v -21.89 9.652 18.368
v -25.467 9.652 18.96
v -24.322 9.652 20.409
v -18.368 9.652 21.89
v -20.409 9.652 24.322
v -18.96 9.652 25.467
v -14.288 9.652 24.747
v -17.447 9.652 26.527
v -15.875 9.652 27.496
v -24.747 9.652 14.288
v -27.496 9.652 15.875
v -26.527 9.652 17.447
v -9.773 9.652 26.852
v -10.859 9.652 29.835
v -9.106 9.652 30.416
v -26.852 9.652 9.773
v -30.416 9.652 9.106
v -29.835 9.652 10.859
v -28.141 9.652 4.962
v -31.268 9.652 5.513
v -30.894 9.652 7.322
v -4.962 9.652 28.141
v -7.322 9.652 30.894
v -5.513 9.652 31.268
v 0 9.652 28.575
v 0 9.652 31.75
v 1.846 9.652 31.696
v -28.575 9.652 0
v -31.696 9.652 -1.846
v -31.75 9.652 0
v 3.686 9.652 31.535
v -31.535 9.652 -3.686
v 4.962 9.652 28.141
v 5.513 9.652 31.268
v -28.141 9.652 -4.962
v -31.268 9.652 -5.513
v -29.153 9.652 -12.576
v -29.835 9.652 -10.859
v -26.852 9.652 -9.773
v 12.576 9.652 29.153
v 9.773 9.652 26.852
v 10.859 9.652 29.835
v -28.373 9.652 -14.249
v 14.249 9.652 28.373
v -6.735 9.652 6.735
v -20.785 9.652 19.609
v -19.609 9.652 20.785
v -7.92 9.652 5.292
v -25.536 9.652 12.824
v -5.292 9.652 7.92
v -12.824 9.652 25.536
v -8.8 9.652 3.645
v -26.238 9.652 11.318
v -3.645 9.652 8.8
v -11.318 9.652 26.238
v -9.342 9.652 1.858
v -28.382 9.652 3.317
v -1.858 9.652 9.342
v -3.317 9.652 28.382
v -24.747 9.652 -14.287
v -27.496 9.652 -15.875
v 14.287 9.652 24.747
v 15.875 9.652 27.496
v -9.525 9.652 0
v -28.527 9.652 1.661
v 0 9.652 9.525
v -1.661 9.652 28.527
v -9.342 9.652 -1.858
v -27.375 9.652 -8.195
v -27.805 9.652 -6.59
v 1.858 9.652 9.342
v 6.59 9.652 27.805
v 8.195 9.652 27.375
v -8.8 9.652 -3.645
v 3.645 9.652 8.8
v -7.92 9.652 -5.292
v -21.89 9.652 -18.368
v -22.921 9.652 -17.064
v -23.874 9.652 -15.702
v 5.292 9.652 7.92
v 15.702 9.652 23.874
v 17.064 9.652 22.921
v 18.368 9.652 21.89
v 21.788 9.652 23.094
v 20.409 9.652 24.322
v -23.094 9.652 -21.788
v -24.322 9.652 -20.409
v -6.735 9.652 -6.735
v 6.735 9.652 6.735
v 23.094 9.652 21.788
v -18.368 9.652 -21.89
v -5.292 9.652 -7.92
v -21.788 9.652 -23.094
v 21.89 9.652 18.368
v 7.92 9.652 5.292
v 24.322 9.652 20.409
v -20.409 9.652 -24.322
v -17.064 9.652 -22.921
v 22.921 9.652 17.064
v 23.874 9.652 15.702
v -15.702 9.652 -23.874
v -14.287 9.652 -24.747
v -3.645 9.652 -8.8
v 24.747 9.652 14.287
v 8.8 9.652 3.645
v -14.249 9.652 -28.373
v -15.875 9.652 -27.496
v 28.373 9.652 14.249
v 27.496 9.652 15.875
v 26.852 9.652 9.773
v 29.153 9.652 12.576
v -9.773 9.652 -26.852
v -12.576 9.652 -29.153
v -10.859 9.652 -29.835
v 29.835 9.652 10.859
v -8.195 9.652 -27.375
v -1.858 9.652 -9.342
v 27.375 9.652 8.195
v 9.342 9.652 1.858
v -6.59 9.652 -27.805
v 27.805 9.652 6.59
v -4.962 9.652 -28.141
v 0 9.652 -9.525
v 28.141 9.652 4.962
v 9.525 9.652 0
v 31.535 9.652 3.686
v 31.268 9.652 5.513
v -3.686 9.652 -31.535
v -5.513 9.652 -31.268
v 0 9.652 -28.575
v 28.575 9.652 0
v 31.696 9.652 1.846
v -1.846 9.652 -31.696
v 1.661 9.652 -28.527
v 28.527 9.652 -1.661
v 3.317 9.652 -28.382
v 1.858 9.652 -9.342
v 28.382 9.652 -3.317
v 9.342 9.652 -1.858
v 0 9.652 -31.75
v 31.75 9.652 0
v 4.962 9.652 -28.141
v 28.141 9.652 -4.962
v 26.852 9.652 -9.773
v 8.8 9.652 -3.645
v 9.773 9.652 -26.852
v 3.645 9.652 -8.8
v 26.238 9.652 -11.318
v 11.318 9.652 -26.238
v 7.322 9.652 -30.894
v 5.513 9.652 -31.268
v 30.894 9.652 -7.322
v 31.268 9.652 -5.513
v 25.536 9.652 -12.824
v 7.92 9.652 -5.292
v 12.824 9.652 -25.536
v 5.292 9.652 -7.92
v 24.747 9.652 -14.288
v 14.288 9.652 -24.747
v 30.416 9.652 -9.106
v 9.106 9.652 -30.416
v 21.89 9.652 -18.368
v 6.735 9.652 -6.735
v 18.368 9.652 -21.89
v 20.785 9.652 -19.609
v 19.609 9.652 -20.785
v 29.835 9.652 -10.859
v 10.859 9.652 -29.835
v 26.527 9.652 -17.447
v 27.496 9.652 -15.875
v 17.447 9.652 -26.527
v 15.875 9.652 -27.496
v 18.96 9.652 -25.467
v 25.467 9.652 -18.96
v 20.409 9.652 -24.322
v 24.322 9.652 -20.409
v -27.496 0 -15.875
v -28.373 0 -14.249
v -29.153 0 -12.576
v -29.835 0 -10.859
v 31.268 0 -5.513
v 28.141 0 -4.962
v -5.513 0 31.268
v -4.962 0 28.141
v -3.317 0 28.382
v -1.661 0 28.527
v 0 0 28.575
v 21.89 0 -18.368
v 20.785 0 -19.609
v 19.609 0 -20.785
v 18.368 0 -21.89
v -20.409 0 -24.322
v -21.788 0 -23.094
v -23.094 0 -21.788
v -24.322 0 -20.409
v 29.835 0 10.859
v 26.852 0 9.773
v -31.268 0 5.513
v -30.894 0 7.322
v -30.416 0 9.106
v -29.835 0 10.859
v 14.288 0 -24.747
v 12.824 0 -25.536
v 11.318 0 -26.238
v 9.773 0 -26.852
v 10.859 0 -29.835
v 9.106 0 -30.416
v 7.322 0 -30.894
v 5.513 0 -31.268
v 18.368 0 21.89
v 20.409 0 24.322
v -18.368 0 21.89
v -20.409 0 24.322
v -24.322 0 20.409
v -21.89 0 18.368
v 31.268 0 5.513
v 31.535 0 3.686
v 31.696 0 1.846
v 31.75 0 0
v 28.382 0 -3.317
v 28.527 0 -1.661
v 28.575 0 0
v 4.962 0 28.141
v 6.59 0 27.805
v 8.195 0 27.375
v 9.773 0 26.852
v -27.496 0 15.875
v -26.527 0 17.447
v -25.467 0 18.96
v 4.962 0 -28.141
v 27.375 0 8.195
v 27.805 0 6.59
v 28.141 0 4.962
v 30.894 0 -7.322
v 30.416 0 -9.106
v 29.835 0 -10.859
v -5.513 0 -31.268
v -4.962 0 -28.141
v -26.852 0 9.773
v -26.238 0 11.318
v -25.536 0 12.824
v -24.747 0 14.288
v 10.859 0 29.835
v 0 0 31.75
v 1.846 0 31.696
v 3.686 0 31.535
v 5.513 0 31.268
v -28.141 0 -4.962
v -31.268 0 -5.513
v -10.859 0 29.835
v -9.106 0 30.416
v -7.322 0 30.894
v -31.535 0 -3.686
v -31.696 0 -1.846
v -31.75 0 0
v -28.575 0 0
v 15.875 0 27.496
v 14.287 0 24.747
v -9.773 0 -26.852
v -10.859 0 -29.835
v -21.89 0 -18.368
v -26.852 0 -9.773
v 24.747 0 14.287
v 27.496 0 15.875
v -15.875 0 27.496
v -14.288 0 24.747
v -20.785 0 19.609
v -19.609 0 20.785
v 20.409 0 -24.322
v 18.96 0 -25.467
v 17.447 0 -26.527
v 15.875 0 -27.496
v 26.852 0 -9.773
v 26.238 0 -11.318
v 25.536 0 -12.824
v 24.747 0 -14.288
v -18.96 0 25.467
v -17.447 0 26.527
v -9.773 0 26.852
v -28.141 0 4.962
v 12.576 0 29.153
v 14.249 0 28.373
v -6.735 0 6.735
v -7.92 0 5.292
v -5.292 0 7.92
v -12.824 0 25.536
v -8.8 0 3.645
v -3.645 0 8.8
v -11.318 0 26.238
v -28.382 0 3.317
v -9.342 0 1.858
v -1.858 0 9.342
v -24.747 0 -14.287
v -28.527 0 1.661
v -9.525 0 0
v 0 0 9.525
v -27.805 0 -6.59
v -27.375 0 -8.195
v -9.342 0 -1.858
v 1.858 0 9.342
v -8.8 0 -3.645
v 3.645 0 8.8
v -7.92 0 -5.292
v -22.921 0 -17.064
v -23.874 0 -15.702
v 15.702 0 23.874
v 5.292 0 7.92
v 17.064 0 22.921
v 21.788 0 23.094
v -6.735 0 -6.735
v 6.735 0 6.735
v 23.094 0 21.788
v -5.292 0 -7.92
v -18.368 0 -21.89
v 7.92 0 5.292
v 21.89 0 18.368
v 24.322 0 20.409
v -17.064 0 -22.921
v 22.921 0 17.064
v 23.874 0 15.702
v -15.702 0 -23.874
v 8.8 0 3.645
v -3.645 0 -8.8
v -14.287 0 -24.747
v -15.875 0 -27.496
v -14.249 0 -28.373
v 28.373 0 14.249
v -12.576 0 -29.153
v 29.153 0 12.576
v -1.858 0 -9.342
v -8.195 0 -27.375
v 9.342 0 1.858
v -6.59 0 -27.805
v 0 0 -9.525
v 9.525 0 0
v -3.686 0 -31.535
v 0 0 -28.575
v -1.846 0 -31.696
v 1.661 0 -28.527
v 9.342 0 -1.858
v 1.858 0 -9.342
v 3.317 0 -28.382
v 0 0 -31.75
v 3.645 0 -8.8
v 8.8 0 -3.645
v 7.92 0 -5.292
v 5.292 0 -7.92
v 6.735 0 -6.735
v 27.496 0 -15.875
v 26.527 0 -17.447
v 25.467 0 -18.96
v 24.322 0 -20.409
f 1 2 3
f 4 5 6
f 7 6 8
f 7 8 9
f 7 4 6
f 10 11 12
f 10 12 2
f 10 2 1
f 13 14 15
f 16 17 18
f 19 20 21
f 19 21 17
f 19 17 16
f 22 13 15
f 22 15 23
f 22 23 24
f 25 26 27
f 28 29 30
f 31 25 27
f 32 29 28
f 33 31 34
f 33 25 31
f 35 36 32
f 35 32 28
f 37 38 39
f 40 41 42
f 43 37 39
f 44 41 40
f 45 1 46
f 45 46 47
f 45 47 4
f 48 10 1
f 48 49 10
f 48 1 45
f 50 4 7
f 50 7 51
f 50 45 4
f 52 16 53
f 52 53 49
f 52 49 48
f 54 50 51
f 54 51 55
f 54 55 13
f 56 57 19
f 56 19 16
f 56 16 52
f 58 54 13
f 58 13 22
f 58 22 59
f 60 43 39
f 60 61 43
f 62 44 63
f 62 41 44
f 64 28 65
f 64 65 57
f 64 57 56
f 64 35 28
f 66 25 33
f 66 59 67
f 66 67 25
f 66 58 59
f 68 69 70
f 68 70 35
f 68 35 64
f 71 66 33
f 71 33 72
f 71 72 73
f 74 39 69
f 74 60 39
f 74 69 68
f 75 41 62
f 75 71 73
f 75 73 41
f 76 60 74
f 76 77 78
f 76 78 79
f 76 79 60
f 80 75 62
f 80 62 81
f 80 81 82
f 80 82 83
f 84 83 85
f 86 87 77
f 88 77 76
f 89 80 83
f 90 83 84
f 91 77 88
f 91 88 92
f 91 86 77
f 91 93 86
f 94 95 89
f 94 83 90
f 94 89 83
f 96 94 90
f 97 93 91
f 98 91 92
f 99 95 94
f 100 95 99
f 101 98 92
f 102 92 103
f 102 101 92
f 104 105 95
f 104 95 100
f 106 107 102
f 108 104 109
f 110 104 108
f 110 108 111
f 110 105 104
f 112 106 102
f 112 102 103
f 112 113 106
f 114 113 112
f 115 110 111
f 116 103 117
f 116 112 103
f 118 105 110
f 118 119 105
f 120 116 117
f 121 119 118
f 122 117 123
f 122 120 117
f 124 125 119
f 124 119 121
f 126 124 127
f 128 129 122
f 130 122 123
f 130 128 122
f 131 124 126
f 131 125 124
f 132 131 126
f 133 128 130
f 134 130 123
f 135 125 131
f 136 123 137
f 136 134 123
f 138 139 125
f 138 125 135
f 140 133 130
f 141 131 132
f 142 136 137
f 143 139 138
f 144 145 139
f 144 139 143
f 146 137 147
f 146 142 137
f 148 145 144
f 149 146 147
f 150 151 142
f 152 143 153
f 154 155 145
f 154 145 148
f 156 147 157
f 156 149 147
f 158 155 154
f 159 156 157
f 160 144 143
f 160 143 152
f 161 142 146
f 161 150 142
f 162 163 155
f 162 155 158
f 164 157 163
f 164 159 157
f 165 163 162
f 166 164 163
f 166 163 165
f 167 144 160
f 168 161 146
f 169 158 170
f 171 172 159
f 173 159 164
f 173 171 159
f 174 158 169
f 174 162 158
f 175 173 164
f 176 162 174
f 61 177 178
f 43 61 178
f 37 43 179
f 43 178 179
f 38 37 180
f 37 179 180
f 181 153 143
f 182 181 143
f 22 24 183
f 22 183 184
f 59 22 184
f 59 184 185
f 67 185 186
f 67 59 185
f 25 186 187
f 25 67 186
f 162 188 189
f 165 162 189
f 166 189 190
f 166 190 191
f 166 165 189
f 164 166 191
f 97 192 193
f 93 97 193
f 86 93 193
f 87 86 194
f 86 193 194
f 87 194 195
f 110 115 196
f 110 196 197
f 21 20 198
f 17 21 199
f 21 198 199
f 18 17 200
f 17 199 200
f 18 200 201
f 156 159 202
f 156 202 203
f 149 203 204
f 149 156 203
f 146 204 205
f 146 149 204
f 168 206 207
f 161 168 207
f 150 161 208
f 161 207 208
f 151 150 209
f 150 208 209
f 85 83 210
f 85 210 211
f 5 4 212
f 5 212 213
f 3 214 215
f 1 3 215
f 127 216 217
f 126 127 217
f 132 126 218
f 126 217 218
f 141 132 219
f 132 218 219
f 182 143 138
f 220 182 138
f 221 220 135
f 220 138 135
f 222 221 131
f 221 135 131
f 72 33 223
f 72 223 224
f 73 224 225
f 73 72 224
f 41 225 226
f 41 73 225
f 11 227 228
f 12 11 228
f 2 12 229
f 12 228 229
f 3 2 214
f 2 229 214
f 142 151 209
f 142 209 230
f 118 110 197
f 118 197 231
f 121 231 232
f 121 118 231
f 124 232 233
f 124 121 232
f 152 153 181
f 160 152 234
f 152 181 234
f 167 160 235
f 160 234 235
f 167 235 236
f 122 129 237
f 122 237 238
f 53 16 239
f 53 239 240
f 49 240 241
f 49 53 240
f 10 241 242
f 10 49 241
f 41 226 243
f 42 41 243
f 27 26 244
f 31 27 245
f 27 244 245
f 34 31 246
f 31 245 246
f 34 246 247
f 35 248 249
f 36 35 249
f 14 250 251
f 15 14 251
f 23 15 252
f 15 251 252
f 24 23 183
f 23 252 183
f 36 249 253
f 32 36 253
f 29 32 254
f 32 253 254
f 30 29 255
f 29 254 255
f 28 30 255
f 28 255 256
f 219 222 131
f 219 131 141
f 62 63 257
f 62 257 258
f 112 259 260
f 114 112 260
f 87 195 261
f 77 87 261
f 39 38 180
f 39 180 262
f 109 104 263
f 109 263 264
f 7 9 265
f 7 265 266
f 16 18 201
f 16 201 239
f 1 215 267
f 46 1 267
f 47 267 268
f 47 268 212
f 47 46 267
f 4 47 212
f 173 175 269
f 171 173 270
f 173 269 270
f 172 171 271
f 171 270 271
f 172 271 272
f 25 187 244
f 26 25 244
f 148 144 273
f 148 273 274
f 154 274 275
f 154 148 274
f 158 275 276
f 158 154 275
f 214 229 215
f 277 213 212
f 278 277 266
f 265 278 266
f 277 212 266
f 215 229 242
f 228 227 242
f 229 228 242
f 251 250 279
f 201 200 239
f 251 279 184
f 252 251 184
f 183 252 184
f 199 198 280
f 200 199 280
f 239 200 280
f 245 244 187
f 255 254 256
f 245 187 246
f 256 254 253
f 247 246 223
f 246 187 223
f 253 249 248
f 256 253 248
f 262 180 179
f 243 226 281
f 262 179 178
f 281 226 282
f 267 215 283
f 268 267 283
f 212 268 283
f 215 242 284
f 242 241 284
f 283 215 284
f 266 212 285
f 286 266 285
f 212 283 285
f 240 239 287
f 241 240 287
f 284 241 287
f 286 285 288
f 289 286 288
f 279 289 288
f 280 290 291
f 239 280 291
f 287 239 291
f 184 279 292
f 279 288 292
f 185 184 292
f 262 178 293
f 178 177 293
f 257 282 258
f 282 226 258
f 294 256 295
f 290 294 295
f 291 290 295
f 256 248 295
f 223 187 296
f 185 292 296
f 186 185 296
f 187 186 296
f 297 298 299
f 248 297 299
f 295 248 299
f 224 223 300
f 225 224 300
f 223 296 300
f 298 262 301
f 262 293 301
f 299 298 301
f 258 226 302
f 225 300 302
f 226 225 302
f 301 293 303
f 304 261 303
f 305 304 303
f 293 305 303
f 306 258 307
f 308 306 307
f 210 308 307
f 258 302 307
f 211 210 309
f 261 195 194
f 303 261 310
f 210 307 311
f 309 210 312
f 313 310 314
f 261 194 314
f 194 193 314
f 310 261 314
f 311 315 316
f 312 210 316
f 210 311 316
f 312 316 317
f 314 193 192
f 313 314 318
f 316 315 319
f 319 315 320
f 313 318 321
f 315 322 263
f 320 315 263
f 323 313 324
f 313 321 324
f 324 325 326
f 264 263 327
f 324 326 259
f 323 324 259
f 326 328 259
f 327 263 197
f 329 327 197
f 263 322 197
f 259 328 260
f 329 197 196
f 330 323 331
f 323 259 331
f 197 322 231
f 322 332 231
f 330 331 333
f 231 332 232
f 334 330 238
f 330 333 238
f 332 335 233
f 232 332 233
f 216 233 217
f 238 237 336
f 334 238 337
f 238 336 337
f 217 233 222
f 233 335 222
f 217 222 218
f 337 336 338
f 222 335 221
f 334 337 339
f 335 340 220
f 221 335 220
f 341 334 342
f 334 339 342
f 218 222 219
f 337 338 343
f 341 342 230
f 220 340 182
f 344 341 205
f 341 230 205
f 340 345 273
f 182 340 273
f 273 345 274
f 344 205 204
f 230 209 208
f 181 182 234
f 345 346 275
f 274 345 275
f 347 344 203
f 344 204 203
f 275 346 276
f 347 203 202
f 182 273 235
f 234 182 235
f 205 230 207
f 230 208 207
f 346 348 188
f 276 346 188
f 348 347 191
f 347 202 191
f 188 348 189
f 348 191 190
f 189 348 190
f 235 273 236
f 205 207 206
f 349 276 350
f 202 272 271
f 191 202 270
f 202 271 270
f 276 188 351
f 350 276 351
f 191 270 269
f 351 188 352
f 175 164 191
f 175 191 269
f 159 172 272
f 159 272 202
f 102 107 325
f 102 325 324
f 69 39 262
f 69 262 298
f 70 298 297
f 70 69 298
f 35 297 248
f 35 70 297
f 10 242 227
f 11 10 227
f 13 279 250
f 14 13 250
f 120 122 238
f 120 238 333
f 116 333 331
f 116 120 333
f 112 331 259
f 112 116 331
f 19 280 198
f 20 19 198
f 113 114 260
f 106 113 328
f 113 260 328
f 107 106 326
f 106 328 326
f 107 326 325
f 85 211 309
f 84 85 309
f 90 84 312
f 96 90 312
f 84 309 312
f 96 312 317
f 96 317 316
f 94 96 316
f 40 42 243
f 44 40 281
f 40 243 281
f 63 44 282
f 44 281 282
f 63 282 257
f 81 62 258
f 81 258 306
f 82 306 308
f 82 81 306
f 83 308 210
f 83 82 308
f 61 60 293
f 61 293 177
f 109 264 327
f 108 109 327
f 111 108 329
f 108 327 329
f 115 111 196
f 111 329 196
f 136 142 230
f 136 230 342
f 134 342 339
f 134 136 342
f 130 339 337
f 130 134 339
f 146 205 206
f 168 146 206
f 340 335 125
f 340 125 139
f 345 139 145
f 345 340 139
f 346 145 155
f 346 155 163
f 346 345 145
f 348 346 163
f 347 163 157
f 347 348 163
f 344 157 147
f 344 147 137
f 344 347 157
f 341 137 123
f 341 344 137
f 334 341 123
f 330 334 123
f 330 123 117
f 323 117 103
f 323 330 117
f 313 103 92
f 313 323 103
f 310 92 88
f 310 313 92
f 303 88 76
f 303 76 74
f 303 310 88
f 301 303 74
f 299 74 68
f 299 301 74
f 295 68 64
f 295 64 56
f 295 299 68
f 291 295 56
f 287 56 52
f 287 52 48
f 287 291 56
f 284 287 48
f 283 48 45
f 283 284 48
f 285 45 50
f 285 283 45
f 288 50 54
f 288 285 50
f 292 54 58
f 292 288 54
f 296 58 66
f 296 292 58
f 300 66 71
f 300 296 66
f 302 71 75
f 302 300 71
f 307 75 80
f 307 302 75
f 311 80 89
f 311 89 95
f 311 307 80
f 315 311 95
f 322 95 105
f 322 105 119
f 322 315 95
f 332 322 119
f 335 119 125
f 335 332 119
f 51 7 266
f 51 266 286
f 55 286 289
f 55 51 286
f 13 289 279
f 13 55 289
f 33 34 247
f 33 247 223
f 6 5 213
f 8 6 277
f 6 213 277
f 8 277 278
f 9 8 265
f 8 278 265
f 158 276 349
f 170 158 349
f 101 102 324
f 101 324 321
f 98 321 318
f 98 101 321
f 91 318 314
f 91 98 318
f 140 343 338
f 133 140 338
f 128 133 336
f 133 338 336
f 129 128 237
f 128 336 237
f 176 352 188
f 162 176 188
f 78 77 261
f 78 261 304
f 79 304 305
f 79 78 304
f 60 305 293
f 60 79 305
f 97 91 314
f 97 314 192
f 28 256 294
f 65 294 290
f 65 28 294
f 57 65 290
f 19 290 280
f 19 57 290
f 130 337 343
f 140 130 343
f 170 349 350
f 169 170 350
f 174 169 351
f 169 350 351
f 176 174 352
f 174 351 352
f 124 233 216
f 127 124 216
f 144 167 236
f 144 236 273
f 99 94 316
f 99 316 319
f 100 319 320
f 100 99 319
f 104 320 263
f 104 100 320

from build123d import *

# Parameters (mm, degrees)
SKETCH1_R           = 31.75
SKETCH1_R_2         = 9.525
BOSS_EXTRUDE1_DEPTH = 9.652
CUT_EXTRUDE1_DEPTH  = 10.652


with BuildPart() as part:
    # Sketch1 → Boss-Extrude1 (new body)
    with BuildSketch(Plane(origin=(0, 0, 0), x_dir=(1, 0, 0), z_dir=(0, 1, 0))):
        Circle(SKETCH1_R)
        Circle(SKETCH1_R_2, mode=Mode.SUBTRACT)
    extrude(amount=BOSS_EXTRUDE1_DEPTH)

    # Sketch2 → Cut-Extrude1 (cut, through all)
    with BuildSketch(Plane(origin=(0, 9.652, 0), x_dir=(1, 0, 0), z_dir=(0, 1, 0))):
        with BuildLine():
            Line((28.575, 0), (43.782696044, 0))
            Line((43.782696044, 0), (43.782696044, 7.720070601))
            Line((43.782696044, 7.720070601), (28.140881542, 4.961996677))
            ThreePointArc((28.140881542, 4.961996677), (28.466263498, 2.490475349), (28.575, 0))
        make_face()
        with BuildLine():
            Line((28.140881542, -4.961996677), (43.782696044, -7.720070601))
            Line((43.782696044, -7.720070601), (41.14227639, -14.974563976))
            Line((41.14227639, -14.974563976), (26.851716639, -9.773225596))
            ThreePointArc((26.851716639, -9.773225596), (27.601330486, -7.395754214), (28.140881542, -4.961996677))
        make_face()
        with BuildLine():
            Line((24.746675913, -14.2875), (38.501856737, -22.229057351))
            Line((38.501856737, -22.229057351), (33.539491009, -28.142974536))
            Line((33.539491009, -28.142974536), (21.889719962, -18.367655947))
            ThreePointArc((21.889719962, -18.367655947), (23.407269666, -16.389946669), (24.746675913, -14.2875))
        make_face()
        with BuildLine():
            Line((18.367655947, -21.889719962), (28.577125281, -34.05689172))
            Line((28.577125281, -34.05689172), (21.891348022, -37.91692702))
            Line((21.891348022, -37.91692702), (14.2875, -24.746675913))
            ThreePointArc((14.2875, -24.746675913), (16.389946669, -23.407269666), (18.367655947, -21.889719962))
        make_face()
        with BuildLine():
            Line((9.773225596, -26.851716639), (15.205570763, -41.77696232))
            Line((15.205570763, -41.77696232), (7.602785381, -43.117538512))
            Line((7.602785381, -43.117538512), (4.961996677, -28.140881542))
            ThreePointArc((4.961996677, -28.140881542), (7.395754214, -27.601330486), (9.773225596, -26.851716639))
        make_face()
        with BuildLine():
            Line((0, -28.575), (0, -44.458114703))
            Line((0, -44.458114703), (-7.602785381, -43.117538512))
            Line((-7.602785381, -43.117538512), (-4.961996677, -28.140881542))
            ThreePointArc((-4.961996677, -28.140881542), (-2.490475349, -28.466263498), (0, -28.575))
        make_face()
        with BuildLine():
            Line((-9.773225596, -26.851716639), (-15.205570763, -41.77696232))
            Line((-15.205570763, -41.77696232), (-21.891348022, -37.91692702))
            Line((-21.891348022, -37.91692702), (-14.2875, -24.746675913))
            ThreePointArc((-14.2875, -24.746675913), (-12.076316829, -25.897745015), (-9.773225596, -26.851716639))
        make_face()
        with BuildLine():
            Line((-18.367655947, -21.889719962), (-28.577125281, -34.05689172))
            Line((-28.577125281, -34.05689172), (-33.539491009, -28.142974536))
            Line((-33.539491009, -28.142974536), (-21.889719962, -18.367655947))
            ThreePointArc((-21.889719962, -18.367655947), (-20.205576272, -20.205576272), (-18.367655947, -21.889719962))
        make_face()
        with BuildLine():
            Line((-24.746675913, -14.2875), (-38.501856737, -22.229057351))
            Line((-38.501856737, -22.229057351), (-41.14227639, -14.974563976))
            Line((-41.14227639, -14.974563976), (-26.851716639, -9.773225596))
            ThreePointArc((-26.851716639, -9.773225596), (-25.897745015, -12.076316829), (-24.746675913, -14.2875))
        make_face()
        with BuildLine():
            Line((-28.140881542, -4.961996677), (-43.782696044, -7.720070601))
            Line((-43.782696044, -7.720070601), (-43.782696044, 0))
            Line((-43.782696044, 0), (-28.575, 0))
            ThreePointArc((-28.575, 0), (-28.466263498, -2.490475349), (-28.140881542, -4.961996677))
        make_face()
        with BuildLine():
            Line((-28.140881542, 4.961996677), (-43.782696044, 7.720070601))
            Line((-43.782696044, 7.720070601), (-41.14227639, 14.974563976))
            Line((-41.14227639, 14.974563976), (-26.851716639, 9.773225596))
            ThreePointArc((-26.851716639, 9.773225596), (-27.601330486, 7.395754214), (-28.140881542, 4.961996677))
        make_face()
        with BuildLine():
            Line((-24.746675913, 14.2875), (-38.501856737, 22.229057351))
            Line((-38.501856737, 22.229057351), (-33.539491009, 28.142974536))
            Line((-33.539491009, 28.142974536), (-21.889719962, 18.367655947))
            ThreePointArc((-21.889719962, 18.367655947), (-23.407269666, 16.389946669), (-24.746675913, 14.2875))
        make_face()
        with BuildLine():
            Line((-18.367655947, 21.889719962), (-28.577125281, 34.05689172))
            Line((-28.577125281, 34.05689172), (-21.891348022, 37.91692702))
            Line((-21.891348022, 37.91692702), (-14.2875, 24.746675913))
            ThreePointArc((-14.2875, 24.746675913), (-16.389946669, 23.407269666), (-18.367655947, 21.889719962))
        make_face()
        with BuildLine():
            Line((-9.773225596, 26.851716639), (-15.205570763, 41.77696232))
            Line((-15.205570763, 41.77696232), (-7.602785381, 43.117538512))
            Line((-7.602785381, 43.117538512), (-4.961996677, 28.140881542))
            ThreePointArc((-4.961996677, 28.140881542), (-7.395754214, 27.601330486), (-9.773225596, 26.851716639))
        make_face()
        with BuildLine():
            Line((0, 28.575), (0, 44.458114703))
            Line((0, 44.458114703), (7.602785381, 43.117538512))
            Line((7.602785381, 43.117538512), (4.961996677, 28.140881542))
            ThreePointArc((4.961996677, 28.140881542), (2.490475349, 28.466263498), (0, 28.575))
        make_face()
        with BuildLine():
            Line((9.773225596, 26.851716639), (15.205570763, 41.77696232))
            Line((15.205570763, 41.77696232), (21.891348022, 37.91692702))
            Line((21.891348022, 37.91692702), (14.2875, 24.746675913))
            ThreePointArc((14.2875, 24.746675913), (12.076316829, 25.897745015), (9.773225596, 26.851716639))
        make_face()
        with BuildLine():
            Line((18.367655947, 21.889719962), (28.577125281, 34.05689172))
            Line((28.577125281, 34.05689172), (33.539491009, 28.142974536))
            Line((33.539491009, 28.142974536), (21.889719962, 18.367655947))
            ThreePointArc((21.889719962, 18.367655947), (20.205576272, 20.205576272), (18.367655947, 21.889719962))
        make_face()
        with BuildLine():
            Line((24.746675913, 14.2875), (38.501856737, 22.229057351))
            Line((38.501856737, 22.229057351), (41.14227639, 14.974563976))
            Line((41.14227639, 14.974563976), (26.851716639, 9.773225596))
            ThreePointArc((26.851716639, 9.773225596), (25.897745015, 12.076316829), (24.746675913, 14.2875))
        make_face()
    extrude(amount=-CUT_EXTRUDE1_DEPTH, mode=Mode.SUBTRACT)


solid = part.part
